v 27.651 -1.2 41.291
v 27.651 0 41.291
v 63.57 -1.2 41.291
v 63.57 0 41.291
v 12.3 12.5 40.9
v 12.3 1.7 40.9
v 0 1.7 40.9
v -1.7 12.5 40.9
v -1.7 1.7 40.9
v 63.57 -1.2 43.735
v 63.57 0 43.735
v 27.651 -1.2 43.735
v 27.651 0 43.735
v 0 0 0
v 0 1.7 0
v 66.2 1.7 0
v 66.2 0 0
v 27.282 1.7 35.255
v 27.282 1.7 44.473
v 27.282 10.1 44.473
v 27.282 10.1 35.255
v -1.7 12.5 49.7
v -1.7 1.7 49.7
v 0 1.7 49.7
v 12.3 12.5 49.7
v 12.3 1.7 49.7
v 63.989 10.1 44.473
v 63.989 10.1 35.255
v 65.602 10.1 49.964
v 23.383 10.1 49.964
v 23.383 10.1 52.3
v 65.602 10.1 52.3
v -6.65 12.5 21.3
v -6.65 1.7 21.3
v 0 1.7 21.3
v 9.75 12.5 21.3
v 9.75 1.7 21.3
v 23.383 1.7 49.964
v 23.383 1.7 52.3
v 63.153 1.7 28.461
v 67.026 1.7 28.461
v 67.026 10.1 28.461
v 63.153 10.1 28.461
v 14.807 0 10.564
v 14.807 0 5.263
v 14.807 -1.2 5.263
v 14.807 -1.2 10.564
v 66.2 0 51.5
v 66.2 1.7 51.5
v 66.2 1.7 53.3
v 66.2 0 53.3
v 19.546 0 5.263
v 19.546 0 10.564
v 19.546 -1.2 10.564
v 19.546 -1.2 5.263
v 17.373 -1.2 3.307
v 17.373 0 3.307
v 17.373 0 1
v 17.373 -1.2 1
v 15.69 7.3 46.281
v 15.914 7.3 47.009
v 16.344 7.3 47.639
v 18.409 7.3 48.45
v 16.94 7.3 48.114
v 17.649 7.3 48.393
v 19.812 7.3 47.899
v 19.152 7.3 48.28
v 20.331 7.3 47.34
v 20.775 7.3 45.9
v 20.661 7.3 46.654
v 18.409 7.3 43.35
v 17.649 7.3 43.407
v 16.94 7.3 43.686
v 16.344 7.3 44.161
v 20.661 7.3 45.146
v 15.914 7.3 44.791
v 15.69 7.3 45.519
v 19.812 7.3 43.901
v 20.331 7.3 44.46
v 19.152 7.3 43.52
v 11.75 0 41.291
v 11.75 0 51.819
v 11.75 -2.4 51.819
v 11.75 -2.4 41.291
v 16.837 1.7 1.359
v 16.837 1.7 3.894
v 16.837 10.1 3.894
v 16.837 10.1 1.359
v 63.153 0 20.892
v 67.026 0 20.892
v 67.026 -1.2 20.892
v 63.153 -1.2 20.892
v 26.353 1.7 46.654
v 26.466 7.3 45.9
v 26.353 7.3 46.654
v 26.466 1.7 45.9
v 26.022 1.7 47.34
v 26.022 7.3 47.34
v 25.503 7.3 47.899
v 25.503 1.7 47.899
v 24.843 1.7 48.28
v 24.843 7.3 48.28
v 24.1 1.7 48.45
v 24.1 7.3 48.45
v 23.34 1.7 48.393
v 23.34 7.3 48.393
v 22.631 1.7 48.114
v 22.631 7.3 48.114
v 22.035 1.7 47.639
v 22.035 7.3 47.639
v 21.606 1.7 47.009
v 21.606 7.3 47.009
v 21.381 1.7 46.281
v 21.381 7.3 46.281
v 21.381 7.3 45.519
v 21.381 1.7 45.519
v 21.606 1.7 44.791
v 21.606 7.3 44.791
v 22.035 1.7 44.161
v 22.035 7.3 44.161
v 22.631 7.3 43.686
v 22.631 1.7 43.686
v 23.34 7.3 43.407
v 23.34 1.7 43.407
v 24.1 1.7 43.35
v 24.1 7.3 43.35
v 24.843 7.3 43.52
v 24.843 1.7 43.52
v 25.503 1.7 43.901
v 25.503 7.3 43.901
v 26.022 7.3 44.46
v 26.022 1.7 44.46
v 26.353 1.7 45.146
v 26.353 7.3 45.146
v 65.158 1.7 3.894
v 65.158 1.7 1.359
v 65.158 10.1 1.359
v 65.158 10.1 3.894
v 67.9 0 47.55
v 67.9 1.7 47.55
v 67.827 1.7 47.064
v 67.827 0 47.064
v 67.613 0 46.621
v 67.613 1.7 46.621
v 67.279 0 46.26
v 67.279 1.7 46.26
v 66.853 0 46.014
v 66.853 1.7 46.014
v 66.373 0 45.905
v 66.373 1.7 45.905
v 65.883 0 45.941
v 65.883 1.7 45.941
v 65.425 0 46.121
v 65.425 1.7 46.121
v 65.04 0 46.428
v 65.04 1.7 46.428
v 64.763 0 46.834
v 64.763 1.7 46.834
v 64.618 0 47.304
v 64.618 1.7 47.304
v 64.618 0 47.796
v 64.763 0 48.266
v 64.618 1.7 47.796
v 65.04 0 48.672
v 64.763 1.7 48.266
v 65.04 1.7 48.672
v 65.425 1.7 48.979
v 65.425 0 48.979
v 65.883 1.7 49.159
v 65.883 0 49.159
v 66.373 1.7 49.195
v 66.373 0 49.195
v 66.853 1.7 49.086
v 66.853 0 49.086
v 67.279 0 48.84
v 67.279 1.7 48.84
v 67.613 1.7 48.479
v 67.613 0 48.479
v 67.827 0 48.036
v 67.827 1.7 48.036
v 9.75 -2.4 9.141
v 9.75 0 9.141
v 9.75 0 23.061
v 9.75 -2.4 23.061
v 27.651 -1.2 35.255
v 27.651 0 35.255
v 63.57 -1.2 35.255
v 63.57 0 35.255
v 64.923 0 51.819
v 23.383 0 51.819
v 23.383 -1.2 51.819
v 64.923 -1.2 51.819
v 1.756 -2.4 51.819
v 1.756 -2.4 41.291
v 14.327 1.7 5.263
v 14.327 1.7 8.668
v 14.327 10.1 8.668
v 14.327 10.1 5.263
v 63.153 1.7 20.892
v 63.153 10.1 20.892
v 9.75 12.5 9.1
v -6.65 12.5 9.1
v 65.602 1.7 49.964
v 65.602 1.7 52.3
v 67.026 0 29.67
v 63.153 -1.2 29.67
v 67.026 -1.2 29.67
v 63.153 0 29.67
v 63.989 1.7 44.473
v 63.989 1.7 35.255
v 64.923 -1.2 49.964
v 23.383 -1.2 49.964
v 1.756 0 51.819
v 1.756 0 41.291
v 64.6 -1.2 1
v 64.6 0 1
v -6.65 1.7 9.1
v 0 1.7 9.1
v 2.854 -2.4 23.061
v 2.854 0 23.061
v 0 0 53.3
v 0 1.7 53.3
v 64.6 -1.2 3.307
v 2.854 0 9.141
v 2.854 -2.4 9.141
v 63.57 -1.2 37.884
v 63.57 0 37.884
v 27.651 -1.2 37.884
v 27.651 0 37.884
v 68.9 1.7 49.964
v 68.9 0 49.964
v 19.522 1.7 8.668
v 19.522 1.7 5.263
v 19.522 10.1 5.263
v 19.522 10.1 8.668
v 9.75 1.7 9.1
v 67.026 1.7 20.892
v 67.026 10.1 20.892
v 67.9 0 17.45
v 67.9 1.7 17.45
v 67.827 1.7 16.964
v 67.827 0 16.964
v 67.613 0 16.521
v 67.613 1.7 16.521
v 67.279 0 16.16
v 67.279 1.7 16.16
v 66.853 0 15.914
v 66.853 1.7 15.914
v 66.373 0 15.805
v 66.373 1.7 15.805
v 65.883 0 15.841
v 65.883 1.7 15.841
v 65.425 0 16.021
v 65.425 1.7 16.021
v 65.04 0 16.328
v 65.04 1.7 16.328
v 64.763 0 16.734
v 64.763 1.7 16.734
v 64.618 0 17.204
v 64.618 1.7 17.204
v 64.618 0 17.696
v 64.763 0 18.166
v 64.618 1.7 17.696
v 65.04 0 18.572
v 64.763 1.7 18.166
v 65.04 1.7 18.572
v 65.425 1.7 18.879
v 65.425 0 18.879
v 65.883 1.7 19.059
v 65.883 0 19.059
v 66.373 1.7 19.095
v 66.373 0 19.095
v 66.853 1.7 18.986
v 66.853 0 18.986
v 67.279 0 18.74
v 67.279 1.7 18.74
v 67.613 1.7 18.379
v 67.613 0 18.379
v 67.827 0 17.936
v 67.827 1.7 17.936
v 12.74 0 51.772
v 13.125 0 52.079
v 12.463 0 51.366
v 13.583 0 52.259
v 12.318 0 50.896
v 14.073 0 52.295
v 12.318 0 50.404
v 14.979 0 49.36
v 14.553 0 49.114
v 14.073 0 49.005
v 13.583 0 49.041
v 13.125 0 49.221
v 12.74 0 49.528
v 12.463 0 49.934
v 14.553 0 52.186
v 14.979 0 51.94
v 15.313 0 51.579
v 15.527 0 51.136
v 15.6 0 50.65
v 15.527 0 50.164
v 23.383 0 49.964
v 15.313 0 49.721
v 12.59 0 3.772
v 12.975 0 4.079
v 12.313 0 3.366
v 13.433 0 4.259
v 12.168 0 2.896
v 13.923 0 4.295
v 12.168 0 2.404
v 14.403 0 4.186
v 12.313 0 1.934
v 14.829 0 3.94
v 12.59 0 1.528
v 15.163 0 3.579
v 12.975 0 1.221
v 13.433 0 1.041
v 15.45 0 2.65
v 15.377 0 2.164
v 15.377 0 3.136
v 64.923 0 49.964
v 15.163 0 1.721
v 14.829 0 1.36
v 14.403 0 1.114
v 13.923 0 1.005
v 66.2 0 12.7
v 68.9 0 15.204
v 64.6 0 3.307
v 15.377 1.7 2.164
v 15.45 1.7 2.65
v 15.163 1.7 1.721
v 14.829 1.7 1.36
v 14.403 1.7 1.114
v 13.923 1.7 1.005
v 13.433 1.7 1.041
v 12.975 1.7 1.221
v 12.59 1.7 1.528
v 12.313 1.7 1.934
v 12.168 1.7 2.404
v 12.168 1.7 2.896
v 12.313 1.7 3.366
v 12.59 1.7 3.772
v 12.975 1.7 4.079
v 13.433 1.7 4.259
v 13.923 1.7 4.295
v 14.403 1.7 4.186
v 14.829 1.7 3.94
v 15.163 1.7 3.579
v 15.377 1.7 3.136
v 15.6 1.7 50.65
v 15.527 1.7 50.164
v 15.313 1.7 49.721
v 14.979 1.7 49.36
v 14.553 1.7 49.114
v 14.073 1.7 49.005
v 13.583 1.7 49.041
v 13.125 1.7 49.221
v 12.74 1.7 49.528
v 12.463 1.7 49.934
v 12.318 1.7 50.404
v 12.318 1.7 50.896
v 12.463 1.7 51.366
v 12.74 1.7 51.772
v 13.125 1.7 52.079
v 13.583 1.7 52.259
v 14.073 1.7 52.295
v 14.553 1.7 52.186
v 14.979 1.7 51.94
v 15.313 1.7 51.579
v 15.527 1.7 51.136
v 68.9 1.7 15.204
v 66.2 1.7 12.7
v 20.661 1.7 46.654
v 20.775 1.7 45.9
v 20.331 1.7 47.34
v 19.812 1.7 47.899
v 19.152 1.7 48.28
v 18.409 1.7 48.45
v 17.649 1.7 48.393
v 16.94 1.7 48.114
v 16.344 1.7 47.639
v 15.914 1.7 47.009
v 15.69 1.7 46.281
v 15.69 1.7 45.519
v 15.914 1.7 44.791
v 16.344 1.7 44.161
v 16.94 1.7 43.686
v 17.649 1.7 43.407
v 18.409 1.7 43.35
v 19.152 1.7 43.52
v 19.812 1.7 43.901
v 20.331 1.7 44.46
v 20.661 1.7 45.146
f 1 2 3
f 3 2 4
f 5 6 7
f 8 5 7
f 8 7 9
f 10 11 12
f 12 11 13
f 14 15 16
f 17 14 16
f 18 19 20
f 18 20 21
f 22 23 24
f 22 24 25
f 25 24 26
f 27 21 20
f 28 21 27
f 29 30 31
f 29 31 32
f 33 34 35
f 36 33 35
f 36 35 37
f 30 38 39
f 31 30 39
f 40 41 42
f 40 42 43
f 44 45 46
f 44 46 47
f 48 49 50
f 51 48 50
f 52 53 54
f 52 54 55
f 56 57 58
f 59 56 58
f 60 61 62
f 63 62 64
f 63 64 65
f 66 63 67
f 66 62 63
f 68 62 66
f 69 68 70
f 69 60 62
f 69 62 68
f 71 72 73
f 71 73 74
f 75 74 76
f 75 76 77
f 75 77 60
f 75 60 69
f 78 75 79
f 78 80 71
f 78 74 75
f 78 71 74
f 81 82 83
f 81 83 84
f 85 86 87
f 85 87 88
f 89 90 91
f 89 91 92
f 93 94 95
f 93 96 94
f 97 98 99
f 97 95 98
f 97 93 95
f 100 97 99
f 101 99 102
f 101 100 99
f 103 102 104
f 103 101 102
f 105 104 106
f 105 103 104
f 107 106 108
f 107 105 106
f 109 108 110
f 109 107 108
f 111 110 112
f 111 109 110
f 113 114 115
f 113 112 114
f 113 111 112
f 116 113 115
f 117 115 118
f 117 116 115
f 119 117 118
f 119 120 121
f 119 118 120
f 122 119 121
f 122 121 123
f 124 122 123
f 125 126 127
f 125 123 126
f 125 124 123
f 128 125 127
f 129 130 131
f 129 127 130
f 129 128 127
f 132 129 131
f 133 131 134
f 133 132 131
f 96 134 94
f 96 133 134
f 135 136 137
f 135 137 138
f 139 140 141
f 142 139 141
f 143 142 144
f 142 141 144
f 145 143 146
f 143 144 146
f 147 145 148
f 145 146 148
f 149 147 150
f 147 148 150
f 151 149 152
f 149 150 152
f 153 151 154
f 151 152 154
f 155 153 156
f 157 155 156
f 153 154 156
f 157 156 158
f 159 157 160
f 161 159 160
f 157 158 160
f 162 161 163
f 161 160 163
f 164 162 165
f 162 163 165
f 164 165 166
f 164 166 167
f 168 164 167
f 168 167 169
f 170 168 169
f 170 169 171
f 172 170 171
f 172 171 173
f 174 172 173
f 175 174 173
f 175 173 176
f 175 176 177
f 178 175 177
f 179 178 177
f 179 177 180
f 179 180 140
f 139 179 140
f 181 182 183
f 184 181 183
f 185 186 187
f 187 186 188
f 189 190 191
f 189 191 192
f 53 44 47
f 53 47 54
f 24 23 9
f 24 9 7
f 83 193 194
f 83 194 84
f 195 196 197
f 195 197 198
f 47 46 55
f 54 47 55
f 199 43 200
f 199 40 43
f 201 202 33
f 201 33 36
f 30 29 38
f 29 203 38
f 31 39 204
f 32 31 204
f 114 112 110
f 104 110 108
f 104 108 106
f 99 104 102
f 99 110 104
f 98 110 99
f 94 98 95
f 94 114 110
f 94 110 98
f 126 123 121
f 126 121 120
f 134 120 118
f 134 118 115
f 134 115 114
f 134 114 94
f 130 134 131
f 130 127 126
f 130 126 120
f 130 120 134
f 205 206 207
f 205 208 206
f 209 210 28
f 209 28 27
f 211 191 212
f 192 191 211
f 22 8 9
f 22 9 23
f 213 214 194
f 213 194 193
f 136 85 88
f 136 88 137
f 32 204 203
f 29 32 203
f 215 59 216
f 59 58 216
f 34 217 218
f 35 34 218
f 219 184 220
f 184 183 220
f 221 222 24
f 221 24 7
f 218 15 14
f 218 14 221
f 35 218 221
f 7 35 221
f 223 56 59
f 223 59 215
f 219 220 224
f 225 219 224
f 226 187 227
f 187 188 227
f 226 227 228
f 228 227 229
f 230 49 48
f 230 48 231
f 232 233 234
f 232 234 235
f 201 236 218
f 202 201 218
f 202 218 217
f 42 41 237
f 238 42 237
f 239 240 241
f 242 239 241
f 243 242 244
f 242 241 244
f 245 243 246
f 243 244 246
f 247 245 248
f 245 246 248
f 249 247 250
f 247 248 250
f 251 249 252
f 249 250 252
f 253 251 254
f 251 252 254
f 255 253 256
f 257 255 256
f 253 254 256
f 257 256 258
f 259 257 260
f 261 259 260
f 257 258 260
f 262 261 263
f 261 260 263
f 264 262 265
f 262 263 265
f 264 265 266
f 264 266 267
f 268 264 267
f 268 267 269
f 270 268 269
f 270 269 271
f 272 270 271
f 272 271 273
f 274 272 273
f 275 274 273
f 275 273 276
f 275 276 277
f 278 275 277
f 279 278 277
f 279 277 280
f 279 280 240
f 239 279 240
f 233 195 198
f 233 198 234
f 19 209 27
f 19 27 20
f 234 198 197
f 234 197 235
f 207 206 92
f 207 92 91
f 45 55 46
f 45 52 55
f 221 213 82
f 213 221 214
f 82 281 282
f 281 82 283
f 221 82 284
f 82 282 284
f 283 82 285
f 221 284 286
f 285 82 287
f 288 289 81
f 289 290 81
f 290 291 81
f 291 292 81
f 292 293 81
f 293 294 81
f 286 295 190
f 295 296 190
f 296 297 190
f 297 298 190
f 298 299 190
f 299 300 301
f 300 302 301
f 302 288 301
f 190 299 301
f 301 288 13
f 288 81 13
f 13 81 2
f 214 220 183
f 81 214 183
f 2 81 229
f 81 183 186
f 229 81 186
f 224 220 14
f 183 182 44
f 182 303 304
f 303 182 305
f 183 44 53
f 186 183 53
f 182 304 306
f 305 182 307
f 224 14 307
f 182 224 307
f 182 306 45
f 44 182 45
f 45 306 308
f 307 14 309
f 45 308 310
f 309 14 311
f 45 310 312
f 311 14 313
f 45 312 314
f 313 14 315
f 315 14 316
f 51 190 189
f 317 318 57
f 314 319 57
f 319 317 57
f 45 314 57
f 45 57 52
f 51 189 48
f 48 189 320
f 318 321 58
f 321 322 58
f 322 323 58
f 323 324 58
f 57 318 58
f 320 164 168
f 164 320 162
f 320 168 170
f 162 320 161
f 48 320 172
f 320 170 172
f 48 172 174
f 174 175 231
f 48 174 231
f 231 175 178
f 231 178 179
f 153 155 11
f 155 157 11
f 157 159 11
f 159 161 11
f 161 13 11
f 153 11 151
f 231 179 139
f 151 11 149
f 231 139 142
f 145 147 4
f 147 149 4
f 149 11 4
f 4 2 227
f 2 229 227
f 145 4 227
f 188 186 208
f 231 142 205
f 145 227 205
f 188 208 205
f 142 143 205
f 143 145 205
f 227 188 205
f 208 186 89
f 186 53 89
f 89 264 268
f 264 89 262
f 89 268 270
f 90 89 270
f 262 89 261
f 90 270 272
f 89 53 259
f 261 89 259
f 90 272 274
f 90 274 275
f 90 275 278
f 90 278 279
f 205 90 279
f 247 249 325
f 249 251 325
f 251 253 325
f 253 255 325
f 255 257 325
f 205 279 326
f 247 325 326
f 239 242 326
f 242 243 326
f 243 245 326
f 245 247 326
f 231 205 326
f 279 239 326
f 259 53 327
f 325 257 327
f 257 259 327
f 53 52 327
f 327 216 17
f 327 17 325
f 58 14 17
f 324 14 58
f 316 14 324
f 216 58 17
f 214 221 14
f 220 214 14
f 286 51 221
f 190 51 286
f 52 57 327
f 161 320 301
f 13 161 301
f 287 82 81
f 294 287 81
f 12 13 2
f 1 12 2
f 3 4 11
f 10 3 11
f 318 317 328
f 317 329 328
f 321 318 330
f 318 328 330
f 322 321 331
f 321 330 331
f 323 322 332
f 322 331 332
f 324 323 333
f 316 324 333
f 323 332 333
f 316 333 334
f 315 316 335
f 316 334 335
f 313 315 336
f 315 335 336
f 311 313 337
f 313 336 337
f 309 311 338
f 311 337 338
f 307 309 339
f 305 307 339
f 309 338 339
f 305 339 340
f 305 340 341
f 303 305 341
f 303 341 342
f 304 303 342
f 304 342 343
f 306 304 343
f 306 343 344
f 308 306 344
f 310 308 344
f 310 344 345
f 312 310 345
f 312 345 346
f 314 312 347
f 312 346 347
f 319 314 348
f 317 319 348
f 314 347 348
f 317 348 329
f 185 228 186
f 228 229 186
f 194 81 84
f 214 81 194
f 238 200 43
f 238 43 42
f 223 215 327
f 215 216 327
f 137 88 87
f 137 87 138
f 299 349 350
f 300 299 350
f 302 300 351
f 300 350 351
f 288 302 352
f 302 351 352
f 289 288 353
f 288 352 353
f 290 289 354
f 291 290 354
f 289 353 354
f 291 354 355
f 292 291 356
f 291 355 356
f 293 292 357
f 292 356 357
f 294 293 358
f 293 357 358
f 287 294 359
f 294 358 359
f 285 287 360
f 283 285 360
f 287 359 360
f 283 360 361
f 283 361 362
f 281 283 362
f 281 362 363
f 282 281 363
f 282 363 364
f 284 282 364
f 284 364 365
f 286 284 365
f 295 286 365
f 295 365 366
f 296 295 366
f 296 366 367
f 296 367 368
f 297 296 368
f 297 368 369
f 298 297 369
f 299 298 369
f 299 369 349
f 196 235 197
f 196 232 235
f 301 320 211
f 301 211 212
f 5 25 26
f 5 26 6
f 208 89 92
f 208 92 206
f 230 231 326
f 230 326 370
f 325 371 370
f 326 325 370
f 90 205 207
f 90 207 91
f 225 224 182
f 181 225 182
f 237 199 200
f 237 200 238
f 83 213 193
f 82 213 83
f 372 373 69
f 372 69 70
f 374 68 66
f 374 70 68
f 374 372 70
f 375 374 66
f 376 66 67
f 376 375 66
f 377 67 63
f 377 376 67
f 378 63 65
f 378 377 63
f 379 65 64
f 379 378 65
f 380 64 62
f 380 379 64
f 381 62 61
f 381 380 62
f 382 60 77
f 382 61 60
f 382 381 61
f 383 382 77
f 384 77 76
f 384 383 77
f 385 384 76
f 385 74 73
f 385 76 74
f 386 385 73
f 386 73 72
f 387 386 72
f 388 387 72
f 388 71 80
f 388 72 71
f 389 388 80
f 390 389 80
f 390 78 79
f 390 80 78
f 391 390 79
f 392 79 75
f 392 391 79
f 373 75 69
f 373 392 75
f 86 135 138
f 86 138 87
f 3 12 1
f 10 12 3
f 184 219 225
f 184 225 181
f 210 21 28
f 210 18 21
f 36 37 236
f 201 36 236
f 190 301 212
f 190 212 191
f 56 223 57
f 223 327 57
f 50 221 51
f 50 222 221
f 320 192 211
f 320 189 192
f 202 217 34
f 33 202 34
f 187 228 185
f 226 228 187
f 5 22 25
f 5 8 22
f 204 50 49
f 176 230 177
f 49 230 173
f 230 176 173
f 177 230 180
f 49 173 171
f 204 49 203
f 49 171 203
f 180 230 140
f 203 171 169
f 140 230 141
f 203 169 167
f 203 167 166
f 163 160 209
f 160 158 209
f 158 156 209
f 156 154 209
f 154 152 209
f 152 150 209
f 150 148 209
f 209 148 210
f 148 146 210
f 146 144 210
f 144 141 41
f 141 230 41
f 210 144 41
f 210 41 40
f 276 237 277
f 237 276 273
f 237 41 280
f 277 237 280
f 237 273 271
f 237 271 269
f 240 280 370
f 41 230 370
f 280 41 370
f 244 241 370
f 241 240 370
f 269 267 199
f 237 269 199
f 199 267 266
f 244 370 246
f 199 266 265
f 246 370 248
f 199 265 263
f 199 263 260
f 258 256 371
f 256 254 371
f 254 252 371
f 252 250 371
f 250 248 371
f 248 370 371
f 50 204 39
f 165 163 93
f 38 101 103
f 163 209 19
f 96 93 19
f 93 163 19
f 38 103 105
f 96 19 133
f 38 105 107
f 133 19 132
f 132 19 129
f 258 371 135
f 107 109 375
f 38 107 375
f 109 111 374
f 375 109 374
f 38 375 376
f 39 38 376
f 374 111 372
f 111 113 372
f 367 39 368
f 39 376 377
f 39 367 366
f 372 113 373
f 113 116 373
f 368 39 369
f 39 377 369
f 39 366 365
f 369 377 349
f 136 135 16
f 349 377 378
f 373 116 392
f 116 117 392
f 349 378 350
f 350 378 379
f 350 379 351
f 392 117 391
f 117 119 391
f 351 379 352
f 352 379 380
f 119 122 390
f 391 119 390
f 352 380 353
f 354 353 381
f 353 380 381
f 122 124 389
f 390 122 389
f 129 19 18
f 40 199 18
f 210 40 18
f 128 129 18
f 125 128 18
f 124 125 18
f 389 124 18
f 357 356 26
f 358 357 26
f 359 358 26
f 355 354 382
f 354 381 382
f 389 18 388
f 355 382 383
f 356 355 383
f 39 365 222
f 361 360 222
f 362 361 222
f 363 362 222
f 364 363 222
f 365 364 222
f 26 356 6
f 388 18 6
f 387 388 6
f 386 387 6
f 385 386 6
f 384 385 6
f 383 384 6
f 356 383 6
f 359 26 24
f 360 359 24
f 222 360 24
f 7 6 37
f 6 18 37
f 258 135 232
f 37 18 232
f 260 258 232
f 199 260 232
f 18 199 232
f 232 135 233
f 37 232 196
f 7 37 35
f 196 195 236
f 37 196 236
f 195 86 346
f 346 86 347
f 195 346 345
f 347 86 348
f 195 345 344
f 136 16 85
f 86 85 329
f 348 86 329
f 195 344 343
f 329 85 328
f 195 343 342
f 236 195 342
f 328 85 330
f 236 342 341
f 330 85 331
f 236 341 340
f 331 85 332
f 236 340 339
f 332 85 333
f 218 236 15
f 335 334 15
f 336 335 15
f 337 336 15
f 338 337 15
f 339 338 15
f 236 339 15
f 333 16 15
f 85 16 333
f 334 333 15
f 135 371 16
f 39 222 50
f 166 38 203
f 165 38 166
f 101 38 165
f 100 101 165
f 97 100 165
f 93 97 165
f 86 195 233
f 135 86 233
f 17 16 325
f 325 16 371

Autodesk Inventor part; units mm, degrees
ref_plane "YZ Plane" through (0, 0, 0) normal (1, 0, 0) x (0, 1, 0)
ref_plane "XZ Plane" through (0, 0, 0) normal (0, 1, 0) x (-1, 0, 0)
ref_plane "XY Plane" through (0, 0, 0) normal (0, 0, 1) x (1, 0, 0)
sketch "Sketch1" plane through (0, 0, 0) normal (0, 0, 1) x (1, 0, 0)
  line L0 (0, 0) -> (68.9, 0)
  line L1 (68.9, 0) -> (68.9, 1.7)
  line L2 (68.9, 1.7) -> (0, 1.7)
  line L3 (0, 1.7) -> (0, 0)
  dimension "d0" = 68.9
  dimension "d1" = 1.7
extrude "Extrusion1" add sketch "Sketch1" along normal blind 53.3
sketch "Sketch2" plane through (0, 1.7, 0) normal (0, 1, 0) x (1, 0, 0)
  line L0 (0, -53.3) -> (68.9, -53.3) projected
  line L1 (68.9, 0) -> (68.9, -53.3) projected
  line L2 (68.9, 0) -> (0, 0) projected
  line L3 (0, 0) -> (0, -53.3) projected
  line L4 (66.2, 0) -> (66.2, -53.3)
  line L5 (68.9, -53.3) -> (0, -53.3) projected
  circle A0 centre (66.25, -47.55) radius 1.65
  circle A1 centre (66.25, -17.45) radius 1.65
  circle A2 centre (13.8, -2.65) radius 1.65
  circle A3 centre (13.95, -50.65) radius 1.65
  line L6 (66.2, 0) -> (66.2, -12.7)
  line L7 (66.2, -12.7) -> (68.9, -15.2036)
  line L8 (68.9, 0) -> (68.9, -15.2036)
  line L9 (68.9, 0) -> (68.9, -53.3) projected
  line L10 (66.2, 0) -> (68.9, 0)
  line L11 (0, 0) -> (68.9, 0) projected
  line L12 (68.9, 0) -> (66.2, 0)
  line L13 (66.2, -53.3) -> (66.2, -51.5)
  line L14 (66.2, -51.5) -> (68.9, -49.9641)
  line L15 (68.9, -53.3) -> (66.2, -53.3)
  line L16 (68.9, -53.3) -> (68.9, -49.9641)
  dimension "d4" = 2.7
  dimension "d5" = 5.75
  dimension "d6" = 1
  dimension "d7" = 3.3
  dimension "d8" = 3.3
  dimension "d9" = 3.3
  dimension "d10" = 3.3
  dimension "d11" = 15.8
  dimension "d12" = 1
  dimension "d13" = 1
  dimension "d14" = 1
  dimension "d15" = 13.8
  dimension "d16" = 12.3
  dimension "d17" = 12.7
  dimension "d18" = 2.5036
  dimension "d19" = 1.8
  dimension "d20" = 1.5359
extrude "Extrusion2" cut sketch "Sketch2" against normal blind 53.3 contours L4 L14 L1 L0 | L2 L1 L7 L4 | A0 L4 | L4 A0 | A1 L4 | L4 A1 | A2 | A3
sketch "Sketch3" plane through (0, 1.7, 53.3) normal (0, 1, 0) x (1, 0, 0)
  line L0 (66.2, 53.3) -> (0, 53.3) projected
  line L1 (0, 53.3) -> (0, 0) projected
  line L2 (0, 0) -> (66.2, 0) projected
  line L3 (9.75, 44.2) -> (-6.65, 44.2)
  line L4 (-6.65, 44.2) -> (-6.65, 32)
  line L5 (-6.65, 32) -> (9.75, 32)
  line L6 (9.75, 32) -> (9.75, 44.2)
  line L7 (12.3, 12.4) -> (-1.7, 12.4)
  line L8 (-1.7, 12.4) -> (-1.7, 3.6)
  line L9 (-1.7, 3.6) -> (12.3, 3.6)
  line L10 (12.3, 3.6) -> (12.3, 12.4)
  dimension "d23" = 9.1
  dimension "d24" = 9.75
  dimension "d25" = 16.4
  dimension "d26" = 12.2
  dimension "d27" = 8.8
  dimension "d28" = 14
  dimension "d29" = 12.4
  dimension "d30" = 1.7
extrude "Extrusion3" add sketch "Sketch3" along normal blind 10.8
sketch "Sketch4" plane through (0, 0, 0) normal (0, -1, 0) x (1, 0, 0)
  line L0 (1.7559, 51.8193) -> (11.7504, 51.8193)
  line L1 (11.7504, 51.8193) -> (11.7504, 41.2908)
  line L2 (11.7504, 41.2908) -> (1.7559, 41.2908)
  line L3 (1.7559, 41.2908) -> (1.7559, 51.8193)
  line L4 (2.8536, 9.1407) -> (9.75, 9.1407)
  line L5 (9.75, 9.1407) -> (9.75, 23.0608)
  line L6 (9.75, 23.0608) -> (2.8536, 23.0608)
  line L7 (2.8536, 23.0608) -> (2.8536, 9.1407)
  line L8 (17.3733, 1) -> (64.6, 1)
  line L9 (64.6, 1) -> (64.6, 3.3066)
  line L10 (64.6, 3.3066) -> (17.3733, 3.3066)
  line L11 (17.3733, 3.3066) -> (17.3733, 1)
  line L12 (14.8067, 10.5642) -> (19.5461, 10.5642)
  line L13 (19.5461, 10.5642) -> (19.5461, 5.2627)
  line L14 (19.5461, 5.2627) -> (14.8067, 5.2627)
  line L15 (14.8067, 5.2627) -> (14.8067, 10.5642)
  line L16 (23.3828, 51.8193) -> (64.9232, 51.8193)
  line L17 (64.9232, 51.8193) -> (64.9232, 49.9641)
  line L18 (64.9232, 49.9641) -> (23.3828, 49.9641)
  line L19 (23.3828, 49.9641) -> (23.3828, 51.8193)
  line L20 (63.5698, 43.7351) -> (27.6508, 43.7351)
  line L21 (27.6508, 43.7351) -> (27.6508, 41.2908)
  line L22 (27.6508, 41.2908) -> (63.5698, 41.2908)
  line L23 (63.5698, 41.2908) -> (63.5698, 43.7351)
  line L24 (63.5698, 37.8841) -> (27.6508, 37.8841)
  line L25 (27.6508, 37.8841) -> (27.6508, 35.2553)
  line L26 (27.6508, 35.2553) -> (63.5698, 35.2553)
  line L27 (63.5698, 35.2553) -> (63.5698, 37.8841)
  line L28 (63.1531, 29.6705) -> (67.0258, 29.6705)
  line L29 (67.0258, 29.6705) -> (67.0258, 20.8923)
  line L30 (67.0258, 20.8923) -> (63.1531, 20.8923)
  line L31 (63.1531, 20.8923) -> (63.1531, 29.6705)
extrude "Extrusion5" add sketch "Sketch4" along normal blind 1.2 contours L11 L10 L9 L8 | L12 L13 L14 L15 | L16 L17 L18 L19 | L23 L22 L21 L20 | L27 L26 L25 L24 | L28 L29 L30 L31
extrude "Extrusion6" add sketch "Sketch4" along normal blind 2.4 contours L0 L1 L2 L3 | L7 L6 L5 L4
sketch "Sketch5" plane through (0, 1.7, 0) normal (0, 1, 0) x (1, 0, 0)
  line L0 (16.8373, -1.3594) -> (65.158, -1.3594)
  line L1 (65.158, -1.3594) -> (65.158, -3.8941)
  line L2 (65.158, -3.8941) -> (16.8373, -3.8941)
  line L3 (16.8373, -3.8941) -> (16.8373, -1.3594)
  line L4 (14.3267, -5.2627) -> (19.5222, -5.2627)
  line L5 (19.5222, -5.2627) -> (19.5222, -8.6683)
  line L6 (19.5222, -8.6683) -> (14.3267, -8.6683)
  line L7 (14.3267, -8.6683) -> (14.3267, -5.2627)
  line L8 (67.0258, -29.6705) -> (67.0258, -20.8923) projected
  line L9 (63.1531, -20.8923) -> (67.0258, -20.8923)
  line L10 (67.0258, -20.8923) -> (67.0258, -28.4607)
  line L11 (67.0258, -28.4607) -> (63.1531, -28.4607)
  line L12 (63.1531, -28.4607) -> (63.1531, -20.8923)
  line L13 (23.3828, -52.3) -> (65.6017, -52.3)
  line L14 (65.6017, -52.3) -> (65.6017, -49.9641)
  line L15 (65.6017, -49.9641) -> (23.3828, -49.9641)
  line L16 (23.3828, -49.9641) -> (23.3828, -52.3)
  line L17 (27.2824, -35.2553) -> (63.9894, -35.2553)
  line L18 (63.9894, -35.2553) -> (63.9894, -44.4726)
  line L19 (63.9894, -44.4726) -> (27.2824, -44.4726)
  line L20 (27.2824, -44.4726) -> (27.2824, -35.2553)
  circle A0 centre (23.9092, -45.9) radius 2.5569
  circle A1 centre (18.2181, -45.9) radius 2.5569
extrude "Extrusion7" add sketch "Sketch5" along normal blind 8.4 contours L0 L1 L2 L3 | L4 L5 L6 L7 | L11 L12 L9 L8 | L16 L15 L14 L13 | L17 L18 L19 L20
extrude "Extrusion8" add sketch "Sketch5" along normal blind 5.6 contours A0 | A1
properties part number "Arduino"
